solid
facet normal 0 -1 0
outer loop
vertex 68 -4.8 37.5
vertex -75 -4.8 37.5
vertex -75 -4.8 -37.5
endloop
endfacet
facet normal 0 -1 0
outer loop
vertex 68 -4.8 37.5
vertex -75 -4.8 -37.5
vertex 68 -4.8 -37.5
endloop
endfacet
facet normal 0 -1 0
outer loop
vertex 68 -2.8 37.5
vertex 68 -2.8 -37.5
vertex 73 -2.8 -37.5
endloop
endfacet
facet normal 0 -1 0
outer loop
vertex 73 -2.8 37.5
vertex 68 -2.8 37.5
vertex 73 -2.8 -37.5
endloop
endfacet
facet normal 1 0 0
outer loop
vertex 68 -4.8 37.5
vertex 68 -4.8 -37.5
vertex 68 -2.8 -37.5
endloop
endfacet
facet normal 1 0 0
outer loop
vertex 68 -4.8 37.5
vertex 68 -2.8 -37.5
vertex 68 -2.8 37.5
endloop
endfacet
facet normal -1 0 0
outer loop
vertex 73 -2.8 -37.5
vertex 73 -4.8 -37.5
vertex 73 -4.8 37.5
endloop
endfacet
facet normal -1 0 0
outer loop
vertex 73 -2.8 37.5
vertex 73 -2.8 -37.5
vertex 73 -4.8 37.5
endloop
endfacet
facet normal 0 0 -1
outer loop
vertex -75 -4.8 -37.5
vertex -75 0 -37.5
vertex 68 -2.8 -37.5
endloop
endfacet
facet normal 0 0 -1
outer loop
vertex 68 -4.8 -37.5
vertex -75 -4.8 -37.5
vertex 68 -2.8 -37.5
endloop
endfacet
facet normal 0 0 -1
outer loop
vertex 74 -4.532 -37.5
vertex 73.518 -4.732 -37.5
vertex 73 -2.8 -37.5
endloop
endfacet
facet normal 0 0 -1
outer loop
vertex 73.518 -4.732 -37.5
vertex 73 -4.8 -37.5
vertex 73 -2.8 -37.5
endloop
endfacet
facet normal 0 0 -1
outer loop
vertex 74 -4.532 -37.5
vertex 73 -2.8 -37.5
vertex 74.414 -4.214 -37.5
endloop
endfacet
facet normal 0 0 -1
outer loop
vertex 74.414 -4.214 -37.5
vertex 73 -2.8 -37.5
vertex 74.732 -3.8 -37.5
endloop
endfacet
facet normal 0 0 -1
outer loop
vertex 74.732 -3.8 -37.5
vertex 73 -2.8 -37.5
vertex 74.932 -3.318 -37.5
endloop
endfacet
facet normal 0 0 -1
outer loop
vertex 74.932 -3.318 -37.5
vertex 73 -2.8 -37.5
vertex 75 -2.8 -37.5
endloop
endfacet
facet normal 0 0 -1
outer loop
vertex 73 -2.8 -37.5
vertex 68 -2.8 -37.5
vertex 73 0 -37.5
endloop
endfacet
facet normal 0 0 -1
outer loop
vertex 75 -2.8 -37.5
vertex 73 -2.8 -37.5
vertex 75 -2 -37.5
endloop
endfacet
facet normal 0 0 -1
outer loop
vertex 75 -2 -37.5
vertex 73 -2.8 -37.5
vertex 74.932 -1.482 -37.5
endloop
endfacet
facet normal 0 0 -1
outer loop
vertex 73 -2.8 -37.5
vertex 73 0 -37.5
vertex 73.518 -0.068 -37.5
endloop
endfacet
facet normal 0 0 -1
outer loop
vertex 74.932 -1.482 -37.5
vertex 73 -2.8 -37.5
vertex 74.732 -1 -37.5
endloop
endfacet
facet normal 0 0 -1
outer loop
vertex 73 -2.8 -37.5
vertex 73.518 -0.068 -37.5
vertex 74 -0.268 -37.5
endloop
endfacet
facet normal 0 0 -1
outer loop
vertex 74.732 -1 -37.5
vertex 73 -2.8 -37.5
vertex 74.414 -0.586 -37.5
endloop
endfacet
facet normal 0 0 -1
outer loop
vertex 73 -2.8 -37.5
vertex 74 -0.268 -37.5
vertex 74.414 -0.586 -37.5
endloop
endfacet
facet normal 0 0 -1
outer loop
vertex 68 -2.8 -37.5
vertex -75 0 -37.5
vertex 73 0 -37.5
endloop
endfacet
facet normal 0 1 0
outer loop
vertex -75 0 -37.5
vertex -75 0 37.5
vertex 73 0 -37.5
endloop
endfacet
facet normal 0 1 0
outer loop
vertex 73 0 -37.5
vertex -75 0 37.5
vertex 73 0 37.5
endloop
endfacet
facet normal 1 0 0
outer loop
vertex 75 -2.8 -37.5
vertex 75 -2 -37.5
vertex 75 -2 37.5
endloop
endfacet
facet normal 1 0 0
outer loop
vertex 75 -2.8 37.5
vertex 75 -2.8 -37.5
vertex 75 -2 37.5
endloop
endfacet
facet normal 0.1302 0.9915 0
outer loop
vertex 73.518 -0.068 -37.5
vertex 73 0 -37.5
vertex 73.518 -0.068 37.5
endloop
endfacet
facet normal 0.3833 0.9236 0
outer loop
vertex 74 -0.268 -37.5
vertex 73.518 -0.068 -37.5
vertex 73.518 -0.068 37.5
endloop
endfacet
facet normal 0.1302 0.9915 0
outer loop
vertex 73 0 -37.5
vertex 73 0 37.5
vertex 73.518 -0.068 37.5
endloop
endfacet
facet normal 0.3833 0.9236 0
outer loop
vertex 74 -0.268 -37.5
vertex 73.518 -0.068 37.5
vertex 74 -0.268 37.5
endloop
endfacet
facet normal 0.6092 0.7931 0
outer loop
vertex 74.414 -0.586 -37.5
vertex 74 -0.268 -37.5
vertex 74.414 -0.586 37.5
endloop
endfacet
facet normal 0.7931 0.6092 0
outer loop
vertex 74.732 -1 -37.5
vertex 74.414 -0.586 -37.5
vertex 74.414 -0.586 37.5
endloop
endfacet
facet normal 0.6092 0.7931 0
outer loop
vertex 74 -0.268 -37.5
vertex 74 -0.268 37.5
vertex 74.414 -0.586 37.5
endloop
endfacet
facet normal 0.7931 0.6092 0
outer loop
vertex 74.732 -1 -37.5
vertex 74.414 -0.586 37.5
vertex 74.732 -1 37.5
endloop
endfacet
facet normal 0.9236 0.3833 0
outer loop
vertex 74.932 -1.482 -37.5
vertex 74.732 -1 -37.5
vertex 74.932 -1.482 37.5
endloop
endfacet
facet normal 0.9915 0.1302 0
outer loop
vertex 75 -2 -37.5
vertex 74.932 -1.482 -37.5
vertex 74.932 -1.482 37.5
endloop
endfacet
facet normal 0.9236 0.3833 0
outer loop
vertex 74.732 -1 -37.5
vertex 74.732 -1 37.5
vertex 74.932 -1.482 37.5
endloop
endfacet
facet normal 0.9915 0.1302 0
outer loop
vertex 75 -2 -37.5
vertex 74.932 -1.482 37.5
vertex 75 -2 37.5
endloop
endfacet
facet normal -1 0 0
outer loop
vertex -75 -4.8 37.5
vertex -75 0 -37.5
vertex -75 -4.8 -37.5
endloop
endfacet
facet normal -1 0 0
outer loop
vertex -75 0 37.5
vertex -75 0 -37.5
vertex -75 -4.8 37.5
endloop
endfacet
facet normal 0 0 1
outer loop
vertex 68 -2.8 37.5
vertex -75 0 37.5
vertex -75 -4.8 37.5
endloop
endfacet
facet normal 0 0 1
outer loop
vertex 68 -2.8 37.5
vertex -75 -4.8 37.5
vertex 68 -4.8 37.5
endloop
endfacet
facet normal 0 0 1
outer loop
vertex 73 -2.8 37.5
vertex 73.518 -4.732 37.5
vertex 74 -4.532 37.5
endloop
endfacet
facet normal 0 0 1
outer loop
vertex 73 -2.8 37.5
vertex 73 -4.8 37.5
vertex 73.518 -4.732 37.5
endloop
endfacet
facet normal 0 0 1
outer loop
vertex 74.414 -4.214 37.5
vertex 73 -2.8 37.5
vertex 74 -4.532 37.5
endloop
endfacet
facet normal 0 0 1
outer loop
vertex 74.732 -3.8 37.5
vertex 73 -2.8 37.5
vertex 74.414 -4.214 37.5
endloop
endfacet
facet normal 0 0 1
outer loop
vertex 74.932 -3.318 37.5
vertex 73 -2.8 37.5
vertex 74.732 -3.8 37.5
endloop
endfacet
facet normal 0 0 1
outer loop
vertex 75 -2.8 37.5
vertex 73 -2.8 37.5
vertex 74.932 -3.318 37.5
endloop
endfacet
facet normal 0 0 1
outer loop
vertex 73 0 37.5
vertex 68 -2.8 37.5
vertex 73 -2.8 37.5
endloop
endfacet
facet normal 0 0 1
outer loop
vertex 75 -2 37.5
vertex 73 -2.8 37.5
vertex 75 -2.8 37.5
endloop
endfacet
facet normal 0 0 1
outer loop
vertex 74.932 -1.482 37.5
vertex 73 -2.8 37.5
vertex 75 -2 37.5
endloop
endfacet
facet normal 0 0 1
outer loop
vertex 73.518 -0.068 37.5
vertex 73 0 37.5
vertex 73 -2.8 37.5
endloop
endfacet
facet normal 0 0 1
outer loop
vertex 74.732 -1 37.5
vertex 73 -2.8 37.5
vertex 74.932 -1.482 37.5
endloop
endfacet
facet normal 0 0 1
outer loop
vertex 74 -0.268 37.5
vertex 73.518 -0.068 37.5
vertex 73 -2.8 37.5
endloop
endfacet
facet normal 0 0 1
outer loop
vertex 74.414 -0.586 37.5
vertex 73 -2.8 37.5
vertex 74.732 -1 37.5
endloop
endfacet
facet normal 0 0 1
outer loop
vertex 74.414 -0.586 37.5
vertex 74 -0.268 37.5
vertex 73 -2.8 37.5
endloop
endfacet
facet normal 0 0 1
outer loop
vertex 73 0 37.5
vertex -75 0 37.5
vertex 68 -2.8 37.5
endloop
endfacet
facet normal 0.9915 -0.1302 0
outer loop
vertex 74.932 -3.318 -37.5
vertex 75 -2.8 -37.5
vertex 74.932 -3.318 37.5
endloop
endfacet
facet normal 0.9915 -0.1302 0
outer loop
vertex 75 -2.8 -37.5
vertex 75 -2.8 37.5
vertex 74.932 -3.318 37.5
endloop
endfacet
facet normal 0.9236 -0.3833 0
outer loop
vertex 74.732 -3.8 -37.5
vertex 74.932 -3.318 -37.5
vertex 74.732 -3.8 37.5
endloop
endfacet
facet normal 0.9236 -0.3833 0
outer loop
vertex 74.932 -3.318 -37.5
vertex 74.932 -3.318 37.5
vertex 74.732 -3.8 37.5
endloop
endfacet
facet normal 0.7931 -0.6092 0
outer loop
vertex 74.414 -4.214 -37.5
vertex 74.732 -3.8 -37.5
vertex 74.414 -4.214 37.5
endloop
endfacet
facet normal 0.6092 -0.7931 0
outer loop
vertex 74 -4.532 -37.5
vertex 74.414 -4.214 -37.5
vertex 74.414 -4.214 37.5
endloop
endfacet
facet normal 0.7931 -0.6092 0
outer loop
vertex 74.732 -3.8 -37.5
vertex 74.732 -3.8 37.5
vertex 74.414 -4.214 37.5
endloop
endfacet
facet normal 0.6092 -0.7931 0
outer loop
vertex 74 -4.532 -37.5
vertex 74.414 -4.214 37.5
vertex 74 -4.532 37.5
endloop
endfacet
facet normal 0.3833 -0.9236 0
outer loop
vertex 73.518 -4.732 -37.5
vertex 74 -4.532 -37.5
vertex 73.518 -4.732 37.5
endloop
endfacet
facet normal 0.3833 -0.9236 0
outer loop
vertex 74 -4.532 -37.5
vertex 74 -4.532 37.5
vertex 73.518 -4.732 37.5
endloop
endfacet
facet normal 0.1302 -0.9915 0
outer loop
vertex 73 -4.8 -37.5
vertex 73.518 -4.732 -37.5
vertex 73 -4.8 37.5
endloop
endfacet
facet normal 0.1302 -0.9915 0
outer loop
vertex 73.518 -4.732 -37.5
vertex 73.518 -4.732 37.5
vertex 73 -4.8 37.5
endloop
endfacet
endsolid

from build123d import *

# Parameters (mm, degrees)
F0_W     = 150
F0_H     = 75
F1_DEPTH = 4.8
F2_W     = 5
F2_H     = 75
F3_DEPTH = 2
F4_R     = 1.99999


# Not quite as in the source:
# - a fillet or chamfer is up to 0.001 mm smaller than in the source, because OpenCascade refuses the exact size


with BuildPart() as f1:
    # F0 (on Front) → F1 (new body)
    with BuildSketch(Plane.XZ):
        Rectangle(F0_W, F0_H)
    extrude(amount=F1_DEPTH)

    # F2 (on face) → F3 (cut)
    with BuildSketch(Plane.XZ.offset(4.8)):
        with Locations((70.5, 0)):
            Rectangle(F2_W, F2_H)
    extrude(amount=-F3_DEPTH, mode=Mode.SUBTRACT)

    # F4 (radius 2 in the source; OpenCascade refuses exactly that, so slightly less here)
    f4_edges = [f1.edges().sort_by_distance(p)[0] for p in [
        (75, 0, 0),
        (75, -4.8, 0),
    ]]
    fillet(f4_edges, radius=F4_R)


solid = f1.part
